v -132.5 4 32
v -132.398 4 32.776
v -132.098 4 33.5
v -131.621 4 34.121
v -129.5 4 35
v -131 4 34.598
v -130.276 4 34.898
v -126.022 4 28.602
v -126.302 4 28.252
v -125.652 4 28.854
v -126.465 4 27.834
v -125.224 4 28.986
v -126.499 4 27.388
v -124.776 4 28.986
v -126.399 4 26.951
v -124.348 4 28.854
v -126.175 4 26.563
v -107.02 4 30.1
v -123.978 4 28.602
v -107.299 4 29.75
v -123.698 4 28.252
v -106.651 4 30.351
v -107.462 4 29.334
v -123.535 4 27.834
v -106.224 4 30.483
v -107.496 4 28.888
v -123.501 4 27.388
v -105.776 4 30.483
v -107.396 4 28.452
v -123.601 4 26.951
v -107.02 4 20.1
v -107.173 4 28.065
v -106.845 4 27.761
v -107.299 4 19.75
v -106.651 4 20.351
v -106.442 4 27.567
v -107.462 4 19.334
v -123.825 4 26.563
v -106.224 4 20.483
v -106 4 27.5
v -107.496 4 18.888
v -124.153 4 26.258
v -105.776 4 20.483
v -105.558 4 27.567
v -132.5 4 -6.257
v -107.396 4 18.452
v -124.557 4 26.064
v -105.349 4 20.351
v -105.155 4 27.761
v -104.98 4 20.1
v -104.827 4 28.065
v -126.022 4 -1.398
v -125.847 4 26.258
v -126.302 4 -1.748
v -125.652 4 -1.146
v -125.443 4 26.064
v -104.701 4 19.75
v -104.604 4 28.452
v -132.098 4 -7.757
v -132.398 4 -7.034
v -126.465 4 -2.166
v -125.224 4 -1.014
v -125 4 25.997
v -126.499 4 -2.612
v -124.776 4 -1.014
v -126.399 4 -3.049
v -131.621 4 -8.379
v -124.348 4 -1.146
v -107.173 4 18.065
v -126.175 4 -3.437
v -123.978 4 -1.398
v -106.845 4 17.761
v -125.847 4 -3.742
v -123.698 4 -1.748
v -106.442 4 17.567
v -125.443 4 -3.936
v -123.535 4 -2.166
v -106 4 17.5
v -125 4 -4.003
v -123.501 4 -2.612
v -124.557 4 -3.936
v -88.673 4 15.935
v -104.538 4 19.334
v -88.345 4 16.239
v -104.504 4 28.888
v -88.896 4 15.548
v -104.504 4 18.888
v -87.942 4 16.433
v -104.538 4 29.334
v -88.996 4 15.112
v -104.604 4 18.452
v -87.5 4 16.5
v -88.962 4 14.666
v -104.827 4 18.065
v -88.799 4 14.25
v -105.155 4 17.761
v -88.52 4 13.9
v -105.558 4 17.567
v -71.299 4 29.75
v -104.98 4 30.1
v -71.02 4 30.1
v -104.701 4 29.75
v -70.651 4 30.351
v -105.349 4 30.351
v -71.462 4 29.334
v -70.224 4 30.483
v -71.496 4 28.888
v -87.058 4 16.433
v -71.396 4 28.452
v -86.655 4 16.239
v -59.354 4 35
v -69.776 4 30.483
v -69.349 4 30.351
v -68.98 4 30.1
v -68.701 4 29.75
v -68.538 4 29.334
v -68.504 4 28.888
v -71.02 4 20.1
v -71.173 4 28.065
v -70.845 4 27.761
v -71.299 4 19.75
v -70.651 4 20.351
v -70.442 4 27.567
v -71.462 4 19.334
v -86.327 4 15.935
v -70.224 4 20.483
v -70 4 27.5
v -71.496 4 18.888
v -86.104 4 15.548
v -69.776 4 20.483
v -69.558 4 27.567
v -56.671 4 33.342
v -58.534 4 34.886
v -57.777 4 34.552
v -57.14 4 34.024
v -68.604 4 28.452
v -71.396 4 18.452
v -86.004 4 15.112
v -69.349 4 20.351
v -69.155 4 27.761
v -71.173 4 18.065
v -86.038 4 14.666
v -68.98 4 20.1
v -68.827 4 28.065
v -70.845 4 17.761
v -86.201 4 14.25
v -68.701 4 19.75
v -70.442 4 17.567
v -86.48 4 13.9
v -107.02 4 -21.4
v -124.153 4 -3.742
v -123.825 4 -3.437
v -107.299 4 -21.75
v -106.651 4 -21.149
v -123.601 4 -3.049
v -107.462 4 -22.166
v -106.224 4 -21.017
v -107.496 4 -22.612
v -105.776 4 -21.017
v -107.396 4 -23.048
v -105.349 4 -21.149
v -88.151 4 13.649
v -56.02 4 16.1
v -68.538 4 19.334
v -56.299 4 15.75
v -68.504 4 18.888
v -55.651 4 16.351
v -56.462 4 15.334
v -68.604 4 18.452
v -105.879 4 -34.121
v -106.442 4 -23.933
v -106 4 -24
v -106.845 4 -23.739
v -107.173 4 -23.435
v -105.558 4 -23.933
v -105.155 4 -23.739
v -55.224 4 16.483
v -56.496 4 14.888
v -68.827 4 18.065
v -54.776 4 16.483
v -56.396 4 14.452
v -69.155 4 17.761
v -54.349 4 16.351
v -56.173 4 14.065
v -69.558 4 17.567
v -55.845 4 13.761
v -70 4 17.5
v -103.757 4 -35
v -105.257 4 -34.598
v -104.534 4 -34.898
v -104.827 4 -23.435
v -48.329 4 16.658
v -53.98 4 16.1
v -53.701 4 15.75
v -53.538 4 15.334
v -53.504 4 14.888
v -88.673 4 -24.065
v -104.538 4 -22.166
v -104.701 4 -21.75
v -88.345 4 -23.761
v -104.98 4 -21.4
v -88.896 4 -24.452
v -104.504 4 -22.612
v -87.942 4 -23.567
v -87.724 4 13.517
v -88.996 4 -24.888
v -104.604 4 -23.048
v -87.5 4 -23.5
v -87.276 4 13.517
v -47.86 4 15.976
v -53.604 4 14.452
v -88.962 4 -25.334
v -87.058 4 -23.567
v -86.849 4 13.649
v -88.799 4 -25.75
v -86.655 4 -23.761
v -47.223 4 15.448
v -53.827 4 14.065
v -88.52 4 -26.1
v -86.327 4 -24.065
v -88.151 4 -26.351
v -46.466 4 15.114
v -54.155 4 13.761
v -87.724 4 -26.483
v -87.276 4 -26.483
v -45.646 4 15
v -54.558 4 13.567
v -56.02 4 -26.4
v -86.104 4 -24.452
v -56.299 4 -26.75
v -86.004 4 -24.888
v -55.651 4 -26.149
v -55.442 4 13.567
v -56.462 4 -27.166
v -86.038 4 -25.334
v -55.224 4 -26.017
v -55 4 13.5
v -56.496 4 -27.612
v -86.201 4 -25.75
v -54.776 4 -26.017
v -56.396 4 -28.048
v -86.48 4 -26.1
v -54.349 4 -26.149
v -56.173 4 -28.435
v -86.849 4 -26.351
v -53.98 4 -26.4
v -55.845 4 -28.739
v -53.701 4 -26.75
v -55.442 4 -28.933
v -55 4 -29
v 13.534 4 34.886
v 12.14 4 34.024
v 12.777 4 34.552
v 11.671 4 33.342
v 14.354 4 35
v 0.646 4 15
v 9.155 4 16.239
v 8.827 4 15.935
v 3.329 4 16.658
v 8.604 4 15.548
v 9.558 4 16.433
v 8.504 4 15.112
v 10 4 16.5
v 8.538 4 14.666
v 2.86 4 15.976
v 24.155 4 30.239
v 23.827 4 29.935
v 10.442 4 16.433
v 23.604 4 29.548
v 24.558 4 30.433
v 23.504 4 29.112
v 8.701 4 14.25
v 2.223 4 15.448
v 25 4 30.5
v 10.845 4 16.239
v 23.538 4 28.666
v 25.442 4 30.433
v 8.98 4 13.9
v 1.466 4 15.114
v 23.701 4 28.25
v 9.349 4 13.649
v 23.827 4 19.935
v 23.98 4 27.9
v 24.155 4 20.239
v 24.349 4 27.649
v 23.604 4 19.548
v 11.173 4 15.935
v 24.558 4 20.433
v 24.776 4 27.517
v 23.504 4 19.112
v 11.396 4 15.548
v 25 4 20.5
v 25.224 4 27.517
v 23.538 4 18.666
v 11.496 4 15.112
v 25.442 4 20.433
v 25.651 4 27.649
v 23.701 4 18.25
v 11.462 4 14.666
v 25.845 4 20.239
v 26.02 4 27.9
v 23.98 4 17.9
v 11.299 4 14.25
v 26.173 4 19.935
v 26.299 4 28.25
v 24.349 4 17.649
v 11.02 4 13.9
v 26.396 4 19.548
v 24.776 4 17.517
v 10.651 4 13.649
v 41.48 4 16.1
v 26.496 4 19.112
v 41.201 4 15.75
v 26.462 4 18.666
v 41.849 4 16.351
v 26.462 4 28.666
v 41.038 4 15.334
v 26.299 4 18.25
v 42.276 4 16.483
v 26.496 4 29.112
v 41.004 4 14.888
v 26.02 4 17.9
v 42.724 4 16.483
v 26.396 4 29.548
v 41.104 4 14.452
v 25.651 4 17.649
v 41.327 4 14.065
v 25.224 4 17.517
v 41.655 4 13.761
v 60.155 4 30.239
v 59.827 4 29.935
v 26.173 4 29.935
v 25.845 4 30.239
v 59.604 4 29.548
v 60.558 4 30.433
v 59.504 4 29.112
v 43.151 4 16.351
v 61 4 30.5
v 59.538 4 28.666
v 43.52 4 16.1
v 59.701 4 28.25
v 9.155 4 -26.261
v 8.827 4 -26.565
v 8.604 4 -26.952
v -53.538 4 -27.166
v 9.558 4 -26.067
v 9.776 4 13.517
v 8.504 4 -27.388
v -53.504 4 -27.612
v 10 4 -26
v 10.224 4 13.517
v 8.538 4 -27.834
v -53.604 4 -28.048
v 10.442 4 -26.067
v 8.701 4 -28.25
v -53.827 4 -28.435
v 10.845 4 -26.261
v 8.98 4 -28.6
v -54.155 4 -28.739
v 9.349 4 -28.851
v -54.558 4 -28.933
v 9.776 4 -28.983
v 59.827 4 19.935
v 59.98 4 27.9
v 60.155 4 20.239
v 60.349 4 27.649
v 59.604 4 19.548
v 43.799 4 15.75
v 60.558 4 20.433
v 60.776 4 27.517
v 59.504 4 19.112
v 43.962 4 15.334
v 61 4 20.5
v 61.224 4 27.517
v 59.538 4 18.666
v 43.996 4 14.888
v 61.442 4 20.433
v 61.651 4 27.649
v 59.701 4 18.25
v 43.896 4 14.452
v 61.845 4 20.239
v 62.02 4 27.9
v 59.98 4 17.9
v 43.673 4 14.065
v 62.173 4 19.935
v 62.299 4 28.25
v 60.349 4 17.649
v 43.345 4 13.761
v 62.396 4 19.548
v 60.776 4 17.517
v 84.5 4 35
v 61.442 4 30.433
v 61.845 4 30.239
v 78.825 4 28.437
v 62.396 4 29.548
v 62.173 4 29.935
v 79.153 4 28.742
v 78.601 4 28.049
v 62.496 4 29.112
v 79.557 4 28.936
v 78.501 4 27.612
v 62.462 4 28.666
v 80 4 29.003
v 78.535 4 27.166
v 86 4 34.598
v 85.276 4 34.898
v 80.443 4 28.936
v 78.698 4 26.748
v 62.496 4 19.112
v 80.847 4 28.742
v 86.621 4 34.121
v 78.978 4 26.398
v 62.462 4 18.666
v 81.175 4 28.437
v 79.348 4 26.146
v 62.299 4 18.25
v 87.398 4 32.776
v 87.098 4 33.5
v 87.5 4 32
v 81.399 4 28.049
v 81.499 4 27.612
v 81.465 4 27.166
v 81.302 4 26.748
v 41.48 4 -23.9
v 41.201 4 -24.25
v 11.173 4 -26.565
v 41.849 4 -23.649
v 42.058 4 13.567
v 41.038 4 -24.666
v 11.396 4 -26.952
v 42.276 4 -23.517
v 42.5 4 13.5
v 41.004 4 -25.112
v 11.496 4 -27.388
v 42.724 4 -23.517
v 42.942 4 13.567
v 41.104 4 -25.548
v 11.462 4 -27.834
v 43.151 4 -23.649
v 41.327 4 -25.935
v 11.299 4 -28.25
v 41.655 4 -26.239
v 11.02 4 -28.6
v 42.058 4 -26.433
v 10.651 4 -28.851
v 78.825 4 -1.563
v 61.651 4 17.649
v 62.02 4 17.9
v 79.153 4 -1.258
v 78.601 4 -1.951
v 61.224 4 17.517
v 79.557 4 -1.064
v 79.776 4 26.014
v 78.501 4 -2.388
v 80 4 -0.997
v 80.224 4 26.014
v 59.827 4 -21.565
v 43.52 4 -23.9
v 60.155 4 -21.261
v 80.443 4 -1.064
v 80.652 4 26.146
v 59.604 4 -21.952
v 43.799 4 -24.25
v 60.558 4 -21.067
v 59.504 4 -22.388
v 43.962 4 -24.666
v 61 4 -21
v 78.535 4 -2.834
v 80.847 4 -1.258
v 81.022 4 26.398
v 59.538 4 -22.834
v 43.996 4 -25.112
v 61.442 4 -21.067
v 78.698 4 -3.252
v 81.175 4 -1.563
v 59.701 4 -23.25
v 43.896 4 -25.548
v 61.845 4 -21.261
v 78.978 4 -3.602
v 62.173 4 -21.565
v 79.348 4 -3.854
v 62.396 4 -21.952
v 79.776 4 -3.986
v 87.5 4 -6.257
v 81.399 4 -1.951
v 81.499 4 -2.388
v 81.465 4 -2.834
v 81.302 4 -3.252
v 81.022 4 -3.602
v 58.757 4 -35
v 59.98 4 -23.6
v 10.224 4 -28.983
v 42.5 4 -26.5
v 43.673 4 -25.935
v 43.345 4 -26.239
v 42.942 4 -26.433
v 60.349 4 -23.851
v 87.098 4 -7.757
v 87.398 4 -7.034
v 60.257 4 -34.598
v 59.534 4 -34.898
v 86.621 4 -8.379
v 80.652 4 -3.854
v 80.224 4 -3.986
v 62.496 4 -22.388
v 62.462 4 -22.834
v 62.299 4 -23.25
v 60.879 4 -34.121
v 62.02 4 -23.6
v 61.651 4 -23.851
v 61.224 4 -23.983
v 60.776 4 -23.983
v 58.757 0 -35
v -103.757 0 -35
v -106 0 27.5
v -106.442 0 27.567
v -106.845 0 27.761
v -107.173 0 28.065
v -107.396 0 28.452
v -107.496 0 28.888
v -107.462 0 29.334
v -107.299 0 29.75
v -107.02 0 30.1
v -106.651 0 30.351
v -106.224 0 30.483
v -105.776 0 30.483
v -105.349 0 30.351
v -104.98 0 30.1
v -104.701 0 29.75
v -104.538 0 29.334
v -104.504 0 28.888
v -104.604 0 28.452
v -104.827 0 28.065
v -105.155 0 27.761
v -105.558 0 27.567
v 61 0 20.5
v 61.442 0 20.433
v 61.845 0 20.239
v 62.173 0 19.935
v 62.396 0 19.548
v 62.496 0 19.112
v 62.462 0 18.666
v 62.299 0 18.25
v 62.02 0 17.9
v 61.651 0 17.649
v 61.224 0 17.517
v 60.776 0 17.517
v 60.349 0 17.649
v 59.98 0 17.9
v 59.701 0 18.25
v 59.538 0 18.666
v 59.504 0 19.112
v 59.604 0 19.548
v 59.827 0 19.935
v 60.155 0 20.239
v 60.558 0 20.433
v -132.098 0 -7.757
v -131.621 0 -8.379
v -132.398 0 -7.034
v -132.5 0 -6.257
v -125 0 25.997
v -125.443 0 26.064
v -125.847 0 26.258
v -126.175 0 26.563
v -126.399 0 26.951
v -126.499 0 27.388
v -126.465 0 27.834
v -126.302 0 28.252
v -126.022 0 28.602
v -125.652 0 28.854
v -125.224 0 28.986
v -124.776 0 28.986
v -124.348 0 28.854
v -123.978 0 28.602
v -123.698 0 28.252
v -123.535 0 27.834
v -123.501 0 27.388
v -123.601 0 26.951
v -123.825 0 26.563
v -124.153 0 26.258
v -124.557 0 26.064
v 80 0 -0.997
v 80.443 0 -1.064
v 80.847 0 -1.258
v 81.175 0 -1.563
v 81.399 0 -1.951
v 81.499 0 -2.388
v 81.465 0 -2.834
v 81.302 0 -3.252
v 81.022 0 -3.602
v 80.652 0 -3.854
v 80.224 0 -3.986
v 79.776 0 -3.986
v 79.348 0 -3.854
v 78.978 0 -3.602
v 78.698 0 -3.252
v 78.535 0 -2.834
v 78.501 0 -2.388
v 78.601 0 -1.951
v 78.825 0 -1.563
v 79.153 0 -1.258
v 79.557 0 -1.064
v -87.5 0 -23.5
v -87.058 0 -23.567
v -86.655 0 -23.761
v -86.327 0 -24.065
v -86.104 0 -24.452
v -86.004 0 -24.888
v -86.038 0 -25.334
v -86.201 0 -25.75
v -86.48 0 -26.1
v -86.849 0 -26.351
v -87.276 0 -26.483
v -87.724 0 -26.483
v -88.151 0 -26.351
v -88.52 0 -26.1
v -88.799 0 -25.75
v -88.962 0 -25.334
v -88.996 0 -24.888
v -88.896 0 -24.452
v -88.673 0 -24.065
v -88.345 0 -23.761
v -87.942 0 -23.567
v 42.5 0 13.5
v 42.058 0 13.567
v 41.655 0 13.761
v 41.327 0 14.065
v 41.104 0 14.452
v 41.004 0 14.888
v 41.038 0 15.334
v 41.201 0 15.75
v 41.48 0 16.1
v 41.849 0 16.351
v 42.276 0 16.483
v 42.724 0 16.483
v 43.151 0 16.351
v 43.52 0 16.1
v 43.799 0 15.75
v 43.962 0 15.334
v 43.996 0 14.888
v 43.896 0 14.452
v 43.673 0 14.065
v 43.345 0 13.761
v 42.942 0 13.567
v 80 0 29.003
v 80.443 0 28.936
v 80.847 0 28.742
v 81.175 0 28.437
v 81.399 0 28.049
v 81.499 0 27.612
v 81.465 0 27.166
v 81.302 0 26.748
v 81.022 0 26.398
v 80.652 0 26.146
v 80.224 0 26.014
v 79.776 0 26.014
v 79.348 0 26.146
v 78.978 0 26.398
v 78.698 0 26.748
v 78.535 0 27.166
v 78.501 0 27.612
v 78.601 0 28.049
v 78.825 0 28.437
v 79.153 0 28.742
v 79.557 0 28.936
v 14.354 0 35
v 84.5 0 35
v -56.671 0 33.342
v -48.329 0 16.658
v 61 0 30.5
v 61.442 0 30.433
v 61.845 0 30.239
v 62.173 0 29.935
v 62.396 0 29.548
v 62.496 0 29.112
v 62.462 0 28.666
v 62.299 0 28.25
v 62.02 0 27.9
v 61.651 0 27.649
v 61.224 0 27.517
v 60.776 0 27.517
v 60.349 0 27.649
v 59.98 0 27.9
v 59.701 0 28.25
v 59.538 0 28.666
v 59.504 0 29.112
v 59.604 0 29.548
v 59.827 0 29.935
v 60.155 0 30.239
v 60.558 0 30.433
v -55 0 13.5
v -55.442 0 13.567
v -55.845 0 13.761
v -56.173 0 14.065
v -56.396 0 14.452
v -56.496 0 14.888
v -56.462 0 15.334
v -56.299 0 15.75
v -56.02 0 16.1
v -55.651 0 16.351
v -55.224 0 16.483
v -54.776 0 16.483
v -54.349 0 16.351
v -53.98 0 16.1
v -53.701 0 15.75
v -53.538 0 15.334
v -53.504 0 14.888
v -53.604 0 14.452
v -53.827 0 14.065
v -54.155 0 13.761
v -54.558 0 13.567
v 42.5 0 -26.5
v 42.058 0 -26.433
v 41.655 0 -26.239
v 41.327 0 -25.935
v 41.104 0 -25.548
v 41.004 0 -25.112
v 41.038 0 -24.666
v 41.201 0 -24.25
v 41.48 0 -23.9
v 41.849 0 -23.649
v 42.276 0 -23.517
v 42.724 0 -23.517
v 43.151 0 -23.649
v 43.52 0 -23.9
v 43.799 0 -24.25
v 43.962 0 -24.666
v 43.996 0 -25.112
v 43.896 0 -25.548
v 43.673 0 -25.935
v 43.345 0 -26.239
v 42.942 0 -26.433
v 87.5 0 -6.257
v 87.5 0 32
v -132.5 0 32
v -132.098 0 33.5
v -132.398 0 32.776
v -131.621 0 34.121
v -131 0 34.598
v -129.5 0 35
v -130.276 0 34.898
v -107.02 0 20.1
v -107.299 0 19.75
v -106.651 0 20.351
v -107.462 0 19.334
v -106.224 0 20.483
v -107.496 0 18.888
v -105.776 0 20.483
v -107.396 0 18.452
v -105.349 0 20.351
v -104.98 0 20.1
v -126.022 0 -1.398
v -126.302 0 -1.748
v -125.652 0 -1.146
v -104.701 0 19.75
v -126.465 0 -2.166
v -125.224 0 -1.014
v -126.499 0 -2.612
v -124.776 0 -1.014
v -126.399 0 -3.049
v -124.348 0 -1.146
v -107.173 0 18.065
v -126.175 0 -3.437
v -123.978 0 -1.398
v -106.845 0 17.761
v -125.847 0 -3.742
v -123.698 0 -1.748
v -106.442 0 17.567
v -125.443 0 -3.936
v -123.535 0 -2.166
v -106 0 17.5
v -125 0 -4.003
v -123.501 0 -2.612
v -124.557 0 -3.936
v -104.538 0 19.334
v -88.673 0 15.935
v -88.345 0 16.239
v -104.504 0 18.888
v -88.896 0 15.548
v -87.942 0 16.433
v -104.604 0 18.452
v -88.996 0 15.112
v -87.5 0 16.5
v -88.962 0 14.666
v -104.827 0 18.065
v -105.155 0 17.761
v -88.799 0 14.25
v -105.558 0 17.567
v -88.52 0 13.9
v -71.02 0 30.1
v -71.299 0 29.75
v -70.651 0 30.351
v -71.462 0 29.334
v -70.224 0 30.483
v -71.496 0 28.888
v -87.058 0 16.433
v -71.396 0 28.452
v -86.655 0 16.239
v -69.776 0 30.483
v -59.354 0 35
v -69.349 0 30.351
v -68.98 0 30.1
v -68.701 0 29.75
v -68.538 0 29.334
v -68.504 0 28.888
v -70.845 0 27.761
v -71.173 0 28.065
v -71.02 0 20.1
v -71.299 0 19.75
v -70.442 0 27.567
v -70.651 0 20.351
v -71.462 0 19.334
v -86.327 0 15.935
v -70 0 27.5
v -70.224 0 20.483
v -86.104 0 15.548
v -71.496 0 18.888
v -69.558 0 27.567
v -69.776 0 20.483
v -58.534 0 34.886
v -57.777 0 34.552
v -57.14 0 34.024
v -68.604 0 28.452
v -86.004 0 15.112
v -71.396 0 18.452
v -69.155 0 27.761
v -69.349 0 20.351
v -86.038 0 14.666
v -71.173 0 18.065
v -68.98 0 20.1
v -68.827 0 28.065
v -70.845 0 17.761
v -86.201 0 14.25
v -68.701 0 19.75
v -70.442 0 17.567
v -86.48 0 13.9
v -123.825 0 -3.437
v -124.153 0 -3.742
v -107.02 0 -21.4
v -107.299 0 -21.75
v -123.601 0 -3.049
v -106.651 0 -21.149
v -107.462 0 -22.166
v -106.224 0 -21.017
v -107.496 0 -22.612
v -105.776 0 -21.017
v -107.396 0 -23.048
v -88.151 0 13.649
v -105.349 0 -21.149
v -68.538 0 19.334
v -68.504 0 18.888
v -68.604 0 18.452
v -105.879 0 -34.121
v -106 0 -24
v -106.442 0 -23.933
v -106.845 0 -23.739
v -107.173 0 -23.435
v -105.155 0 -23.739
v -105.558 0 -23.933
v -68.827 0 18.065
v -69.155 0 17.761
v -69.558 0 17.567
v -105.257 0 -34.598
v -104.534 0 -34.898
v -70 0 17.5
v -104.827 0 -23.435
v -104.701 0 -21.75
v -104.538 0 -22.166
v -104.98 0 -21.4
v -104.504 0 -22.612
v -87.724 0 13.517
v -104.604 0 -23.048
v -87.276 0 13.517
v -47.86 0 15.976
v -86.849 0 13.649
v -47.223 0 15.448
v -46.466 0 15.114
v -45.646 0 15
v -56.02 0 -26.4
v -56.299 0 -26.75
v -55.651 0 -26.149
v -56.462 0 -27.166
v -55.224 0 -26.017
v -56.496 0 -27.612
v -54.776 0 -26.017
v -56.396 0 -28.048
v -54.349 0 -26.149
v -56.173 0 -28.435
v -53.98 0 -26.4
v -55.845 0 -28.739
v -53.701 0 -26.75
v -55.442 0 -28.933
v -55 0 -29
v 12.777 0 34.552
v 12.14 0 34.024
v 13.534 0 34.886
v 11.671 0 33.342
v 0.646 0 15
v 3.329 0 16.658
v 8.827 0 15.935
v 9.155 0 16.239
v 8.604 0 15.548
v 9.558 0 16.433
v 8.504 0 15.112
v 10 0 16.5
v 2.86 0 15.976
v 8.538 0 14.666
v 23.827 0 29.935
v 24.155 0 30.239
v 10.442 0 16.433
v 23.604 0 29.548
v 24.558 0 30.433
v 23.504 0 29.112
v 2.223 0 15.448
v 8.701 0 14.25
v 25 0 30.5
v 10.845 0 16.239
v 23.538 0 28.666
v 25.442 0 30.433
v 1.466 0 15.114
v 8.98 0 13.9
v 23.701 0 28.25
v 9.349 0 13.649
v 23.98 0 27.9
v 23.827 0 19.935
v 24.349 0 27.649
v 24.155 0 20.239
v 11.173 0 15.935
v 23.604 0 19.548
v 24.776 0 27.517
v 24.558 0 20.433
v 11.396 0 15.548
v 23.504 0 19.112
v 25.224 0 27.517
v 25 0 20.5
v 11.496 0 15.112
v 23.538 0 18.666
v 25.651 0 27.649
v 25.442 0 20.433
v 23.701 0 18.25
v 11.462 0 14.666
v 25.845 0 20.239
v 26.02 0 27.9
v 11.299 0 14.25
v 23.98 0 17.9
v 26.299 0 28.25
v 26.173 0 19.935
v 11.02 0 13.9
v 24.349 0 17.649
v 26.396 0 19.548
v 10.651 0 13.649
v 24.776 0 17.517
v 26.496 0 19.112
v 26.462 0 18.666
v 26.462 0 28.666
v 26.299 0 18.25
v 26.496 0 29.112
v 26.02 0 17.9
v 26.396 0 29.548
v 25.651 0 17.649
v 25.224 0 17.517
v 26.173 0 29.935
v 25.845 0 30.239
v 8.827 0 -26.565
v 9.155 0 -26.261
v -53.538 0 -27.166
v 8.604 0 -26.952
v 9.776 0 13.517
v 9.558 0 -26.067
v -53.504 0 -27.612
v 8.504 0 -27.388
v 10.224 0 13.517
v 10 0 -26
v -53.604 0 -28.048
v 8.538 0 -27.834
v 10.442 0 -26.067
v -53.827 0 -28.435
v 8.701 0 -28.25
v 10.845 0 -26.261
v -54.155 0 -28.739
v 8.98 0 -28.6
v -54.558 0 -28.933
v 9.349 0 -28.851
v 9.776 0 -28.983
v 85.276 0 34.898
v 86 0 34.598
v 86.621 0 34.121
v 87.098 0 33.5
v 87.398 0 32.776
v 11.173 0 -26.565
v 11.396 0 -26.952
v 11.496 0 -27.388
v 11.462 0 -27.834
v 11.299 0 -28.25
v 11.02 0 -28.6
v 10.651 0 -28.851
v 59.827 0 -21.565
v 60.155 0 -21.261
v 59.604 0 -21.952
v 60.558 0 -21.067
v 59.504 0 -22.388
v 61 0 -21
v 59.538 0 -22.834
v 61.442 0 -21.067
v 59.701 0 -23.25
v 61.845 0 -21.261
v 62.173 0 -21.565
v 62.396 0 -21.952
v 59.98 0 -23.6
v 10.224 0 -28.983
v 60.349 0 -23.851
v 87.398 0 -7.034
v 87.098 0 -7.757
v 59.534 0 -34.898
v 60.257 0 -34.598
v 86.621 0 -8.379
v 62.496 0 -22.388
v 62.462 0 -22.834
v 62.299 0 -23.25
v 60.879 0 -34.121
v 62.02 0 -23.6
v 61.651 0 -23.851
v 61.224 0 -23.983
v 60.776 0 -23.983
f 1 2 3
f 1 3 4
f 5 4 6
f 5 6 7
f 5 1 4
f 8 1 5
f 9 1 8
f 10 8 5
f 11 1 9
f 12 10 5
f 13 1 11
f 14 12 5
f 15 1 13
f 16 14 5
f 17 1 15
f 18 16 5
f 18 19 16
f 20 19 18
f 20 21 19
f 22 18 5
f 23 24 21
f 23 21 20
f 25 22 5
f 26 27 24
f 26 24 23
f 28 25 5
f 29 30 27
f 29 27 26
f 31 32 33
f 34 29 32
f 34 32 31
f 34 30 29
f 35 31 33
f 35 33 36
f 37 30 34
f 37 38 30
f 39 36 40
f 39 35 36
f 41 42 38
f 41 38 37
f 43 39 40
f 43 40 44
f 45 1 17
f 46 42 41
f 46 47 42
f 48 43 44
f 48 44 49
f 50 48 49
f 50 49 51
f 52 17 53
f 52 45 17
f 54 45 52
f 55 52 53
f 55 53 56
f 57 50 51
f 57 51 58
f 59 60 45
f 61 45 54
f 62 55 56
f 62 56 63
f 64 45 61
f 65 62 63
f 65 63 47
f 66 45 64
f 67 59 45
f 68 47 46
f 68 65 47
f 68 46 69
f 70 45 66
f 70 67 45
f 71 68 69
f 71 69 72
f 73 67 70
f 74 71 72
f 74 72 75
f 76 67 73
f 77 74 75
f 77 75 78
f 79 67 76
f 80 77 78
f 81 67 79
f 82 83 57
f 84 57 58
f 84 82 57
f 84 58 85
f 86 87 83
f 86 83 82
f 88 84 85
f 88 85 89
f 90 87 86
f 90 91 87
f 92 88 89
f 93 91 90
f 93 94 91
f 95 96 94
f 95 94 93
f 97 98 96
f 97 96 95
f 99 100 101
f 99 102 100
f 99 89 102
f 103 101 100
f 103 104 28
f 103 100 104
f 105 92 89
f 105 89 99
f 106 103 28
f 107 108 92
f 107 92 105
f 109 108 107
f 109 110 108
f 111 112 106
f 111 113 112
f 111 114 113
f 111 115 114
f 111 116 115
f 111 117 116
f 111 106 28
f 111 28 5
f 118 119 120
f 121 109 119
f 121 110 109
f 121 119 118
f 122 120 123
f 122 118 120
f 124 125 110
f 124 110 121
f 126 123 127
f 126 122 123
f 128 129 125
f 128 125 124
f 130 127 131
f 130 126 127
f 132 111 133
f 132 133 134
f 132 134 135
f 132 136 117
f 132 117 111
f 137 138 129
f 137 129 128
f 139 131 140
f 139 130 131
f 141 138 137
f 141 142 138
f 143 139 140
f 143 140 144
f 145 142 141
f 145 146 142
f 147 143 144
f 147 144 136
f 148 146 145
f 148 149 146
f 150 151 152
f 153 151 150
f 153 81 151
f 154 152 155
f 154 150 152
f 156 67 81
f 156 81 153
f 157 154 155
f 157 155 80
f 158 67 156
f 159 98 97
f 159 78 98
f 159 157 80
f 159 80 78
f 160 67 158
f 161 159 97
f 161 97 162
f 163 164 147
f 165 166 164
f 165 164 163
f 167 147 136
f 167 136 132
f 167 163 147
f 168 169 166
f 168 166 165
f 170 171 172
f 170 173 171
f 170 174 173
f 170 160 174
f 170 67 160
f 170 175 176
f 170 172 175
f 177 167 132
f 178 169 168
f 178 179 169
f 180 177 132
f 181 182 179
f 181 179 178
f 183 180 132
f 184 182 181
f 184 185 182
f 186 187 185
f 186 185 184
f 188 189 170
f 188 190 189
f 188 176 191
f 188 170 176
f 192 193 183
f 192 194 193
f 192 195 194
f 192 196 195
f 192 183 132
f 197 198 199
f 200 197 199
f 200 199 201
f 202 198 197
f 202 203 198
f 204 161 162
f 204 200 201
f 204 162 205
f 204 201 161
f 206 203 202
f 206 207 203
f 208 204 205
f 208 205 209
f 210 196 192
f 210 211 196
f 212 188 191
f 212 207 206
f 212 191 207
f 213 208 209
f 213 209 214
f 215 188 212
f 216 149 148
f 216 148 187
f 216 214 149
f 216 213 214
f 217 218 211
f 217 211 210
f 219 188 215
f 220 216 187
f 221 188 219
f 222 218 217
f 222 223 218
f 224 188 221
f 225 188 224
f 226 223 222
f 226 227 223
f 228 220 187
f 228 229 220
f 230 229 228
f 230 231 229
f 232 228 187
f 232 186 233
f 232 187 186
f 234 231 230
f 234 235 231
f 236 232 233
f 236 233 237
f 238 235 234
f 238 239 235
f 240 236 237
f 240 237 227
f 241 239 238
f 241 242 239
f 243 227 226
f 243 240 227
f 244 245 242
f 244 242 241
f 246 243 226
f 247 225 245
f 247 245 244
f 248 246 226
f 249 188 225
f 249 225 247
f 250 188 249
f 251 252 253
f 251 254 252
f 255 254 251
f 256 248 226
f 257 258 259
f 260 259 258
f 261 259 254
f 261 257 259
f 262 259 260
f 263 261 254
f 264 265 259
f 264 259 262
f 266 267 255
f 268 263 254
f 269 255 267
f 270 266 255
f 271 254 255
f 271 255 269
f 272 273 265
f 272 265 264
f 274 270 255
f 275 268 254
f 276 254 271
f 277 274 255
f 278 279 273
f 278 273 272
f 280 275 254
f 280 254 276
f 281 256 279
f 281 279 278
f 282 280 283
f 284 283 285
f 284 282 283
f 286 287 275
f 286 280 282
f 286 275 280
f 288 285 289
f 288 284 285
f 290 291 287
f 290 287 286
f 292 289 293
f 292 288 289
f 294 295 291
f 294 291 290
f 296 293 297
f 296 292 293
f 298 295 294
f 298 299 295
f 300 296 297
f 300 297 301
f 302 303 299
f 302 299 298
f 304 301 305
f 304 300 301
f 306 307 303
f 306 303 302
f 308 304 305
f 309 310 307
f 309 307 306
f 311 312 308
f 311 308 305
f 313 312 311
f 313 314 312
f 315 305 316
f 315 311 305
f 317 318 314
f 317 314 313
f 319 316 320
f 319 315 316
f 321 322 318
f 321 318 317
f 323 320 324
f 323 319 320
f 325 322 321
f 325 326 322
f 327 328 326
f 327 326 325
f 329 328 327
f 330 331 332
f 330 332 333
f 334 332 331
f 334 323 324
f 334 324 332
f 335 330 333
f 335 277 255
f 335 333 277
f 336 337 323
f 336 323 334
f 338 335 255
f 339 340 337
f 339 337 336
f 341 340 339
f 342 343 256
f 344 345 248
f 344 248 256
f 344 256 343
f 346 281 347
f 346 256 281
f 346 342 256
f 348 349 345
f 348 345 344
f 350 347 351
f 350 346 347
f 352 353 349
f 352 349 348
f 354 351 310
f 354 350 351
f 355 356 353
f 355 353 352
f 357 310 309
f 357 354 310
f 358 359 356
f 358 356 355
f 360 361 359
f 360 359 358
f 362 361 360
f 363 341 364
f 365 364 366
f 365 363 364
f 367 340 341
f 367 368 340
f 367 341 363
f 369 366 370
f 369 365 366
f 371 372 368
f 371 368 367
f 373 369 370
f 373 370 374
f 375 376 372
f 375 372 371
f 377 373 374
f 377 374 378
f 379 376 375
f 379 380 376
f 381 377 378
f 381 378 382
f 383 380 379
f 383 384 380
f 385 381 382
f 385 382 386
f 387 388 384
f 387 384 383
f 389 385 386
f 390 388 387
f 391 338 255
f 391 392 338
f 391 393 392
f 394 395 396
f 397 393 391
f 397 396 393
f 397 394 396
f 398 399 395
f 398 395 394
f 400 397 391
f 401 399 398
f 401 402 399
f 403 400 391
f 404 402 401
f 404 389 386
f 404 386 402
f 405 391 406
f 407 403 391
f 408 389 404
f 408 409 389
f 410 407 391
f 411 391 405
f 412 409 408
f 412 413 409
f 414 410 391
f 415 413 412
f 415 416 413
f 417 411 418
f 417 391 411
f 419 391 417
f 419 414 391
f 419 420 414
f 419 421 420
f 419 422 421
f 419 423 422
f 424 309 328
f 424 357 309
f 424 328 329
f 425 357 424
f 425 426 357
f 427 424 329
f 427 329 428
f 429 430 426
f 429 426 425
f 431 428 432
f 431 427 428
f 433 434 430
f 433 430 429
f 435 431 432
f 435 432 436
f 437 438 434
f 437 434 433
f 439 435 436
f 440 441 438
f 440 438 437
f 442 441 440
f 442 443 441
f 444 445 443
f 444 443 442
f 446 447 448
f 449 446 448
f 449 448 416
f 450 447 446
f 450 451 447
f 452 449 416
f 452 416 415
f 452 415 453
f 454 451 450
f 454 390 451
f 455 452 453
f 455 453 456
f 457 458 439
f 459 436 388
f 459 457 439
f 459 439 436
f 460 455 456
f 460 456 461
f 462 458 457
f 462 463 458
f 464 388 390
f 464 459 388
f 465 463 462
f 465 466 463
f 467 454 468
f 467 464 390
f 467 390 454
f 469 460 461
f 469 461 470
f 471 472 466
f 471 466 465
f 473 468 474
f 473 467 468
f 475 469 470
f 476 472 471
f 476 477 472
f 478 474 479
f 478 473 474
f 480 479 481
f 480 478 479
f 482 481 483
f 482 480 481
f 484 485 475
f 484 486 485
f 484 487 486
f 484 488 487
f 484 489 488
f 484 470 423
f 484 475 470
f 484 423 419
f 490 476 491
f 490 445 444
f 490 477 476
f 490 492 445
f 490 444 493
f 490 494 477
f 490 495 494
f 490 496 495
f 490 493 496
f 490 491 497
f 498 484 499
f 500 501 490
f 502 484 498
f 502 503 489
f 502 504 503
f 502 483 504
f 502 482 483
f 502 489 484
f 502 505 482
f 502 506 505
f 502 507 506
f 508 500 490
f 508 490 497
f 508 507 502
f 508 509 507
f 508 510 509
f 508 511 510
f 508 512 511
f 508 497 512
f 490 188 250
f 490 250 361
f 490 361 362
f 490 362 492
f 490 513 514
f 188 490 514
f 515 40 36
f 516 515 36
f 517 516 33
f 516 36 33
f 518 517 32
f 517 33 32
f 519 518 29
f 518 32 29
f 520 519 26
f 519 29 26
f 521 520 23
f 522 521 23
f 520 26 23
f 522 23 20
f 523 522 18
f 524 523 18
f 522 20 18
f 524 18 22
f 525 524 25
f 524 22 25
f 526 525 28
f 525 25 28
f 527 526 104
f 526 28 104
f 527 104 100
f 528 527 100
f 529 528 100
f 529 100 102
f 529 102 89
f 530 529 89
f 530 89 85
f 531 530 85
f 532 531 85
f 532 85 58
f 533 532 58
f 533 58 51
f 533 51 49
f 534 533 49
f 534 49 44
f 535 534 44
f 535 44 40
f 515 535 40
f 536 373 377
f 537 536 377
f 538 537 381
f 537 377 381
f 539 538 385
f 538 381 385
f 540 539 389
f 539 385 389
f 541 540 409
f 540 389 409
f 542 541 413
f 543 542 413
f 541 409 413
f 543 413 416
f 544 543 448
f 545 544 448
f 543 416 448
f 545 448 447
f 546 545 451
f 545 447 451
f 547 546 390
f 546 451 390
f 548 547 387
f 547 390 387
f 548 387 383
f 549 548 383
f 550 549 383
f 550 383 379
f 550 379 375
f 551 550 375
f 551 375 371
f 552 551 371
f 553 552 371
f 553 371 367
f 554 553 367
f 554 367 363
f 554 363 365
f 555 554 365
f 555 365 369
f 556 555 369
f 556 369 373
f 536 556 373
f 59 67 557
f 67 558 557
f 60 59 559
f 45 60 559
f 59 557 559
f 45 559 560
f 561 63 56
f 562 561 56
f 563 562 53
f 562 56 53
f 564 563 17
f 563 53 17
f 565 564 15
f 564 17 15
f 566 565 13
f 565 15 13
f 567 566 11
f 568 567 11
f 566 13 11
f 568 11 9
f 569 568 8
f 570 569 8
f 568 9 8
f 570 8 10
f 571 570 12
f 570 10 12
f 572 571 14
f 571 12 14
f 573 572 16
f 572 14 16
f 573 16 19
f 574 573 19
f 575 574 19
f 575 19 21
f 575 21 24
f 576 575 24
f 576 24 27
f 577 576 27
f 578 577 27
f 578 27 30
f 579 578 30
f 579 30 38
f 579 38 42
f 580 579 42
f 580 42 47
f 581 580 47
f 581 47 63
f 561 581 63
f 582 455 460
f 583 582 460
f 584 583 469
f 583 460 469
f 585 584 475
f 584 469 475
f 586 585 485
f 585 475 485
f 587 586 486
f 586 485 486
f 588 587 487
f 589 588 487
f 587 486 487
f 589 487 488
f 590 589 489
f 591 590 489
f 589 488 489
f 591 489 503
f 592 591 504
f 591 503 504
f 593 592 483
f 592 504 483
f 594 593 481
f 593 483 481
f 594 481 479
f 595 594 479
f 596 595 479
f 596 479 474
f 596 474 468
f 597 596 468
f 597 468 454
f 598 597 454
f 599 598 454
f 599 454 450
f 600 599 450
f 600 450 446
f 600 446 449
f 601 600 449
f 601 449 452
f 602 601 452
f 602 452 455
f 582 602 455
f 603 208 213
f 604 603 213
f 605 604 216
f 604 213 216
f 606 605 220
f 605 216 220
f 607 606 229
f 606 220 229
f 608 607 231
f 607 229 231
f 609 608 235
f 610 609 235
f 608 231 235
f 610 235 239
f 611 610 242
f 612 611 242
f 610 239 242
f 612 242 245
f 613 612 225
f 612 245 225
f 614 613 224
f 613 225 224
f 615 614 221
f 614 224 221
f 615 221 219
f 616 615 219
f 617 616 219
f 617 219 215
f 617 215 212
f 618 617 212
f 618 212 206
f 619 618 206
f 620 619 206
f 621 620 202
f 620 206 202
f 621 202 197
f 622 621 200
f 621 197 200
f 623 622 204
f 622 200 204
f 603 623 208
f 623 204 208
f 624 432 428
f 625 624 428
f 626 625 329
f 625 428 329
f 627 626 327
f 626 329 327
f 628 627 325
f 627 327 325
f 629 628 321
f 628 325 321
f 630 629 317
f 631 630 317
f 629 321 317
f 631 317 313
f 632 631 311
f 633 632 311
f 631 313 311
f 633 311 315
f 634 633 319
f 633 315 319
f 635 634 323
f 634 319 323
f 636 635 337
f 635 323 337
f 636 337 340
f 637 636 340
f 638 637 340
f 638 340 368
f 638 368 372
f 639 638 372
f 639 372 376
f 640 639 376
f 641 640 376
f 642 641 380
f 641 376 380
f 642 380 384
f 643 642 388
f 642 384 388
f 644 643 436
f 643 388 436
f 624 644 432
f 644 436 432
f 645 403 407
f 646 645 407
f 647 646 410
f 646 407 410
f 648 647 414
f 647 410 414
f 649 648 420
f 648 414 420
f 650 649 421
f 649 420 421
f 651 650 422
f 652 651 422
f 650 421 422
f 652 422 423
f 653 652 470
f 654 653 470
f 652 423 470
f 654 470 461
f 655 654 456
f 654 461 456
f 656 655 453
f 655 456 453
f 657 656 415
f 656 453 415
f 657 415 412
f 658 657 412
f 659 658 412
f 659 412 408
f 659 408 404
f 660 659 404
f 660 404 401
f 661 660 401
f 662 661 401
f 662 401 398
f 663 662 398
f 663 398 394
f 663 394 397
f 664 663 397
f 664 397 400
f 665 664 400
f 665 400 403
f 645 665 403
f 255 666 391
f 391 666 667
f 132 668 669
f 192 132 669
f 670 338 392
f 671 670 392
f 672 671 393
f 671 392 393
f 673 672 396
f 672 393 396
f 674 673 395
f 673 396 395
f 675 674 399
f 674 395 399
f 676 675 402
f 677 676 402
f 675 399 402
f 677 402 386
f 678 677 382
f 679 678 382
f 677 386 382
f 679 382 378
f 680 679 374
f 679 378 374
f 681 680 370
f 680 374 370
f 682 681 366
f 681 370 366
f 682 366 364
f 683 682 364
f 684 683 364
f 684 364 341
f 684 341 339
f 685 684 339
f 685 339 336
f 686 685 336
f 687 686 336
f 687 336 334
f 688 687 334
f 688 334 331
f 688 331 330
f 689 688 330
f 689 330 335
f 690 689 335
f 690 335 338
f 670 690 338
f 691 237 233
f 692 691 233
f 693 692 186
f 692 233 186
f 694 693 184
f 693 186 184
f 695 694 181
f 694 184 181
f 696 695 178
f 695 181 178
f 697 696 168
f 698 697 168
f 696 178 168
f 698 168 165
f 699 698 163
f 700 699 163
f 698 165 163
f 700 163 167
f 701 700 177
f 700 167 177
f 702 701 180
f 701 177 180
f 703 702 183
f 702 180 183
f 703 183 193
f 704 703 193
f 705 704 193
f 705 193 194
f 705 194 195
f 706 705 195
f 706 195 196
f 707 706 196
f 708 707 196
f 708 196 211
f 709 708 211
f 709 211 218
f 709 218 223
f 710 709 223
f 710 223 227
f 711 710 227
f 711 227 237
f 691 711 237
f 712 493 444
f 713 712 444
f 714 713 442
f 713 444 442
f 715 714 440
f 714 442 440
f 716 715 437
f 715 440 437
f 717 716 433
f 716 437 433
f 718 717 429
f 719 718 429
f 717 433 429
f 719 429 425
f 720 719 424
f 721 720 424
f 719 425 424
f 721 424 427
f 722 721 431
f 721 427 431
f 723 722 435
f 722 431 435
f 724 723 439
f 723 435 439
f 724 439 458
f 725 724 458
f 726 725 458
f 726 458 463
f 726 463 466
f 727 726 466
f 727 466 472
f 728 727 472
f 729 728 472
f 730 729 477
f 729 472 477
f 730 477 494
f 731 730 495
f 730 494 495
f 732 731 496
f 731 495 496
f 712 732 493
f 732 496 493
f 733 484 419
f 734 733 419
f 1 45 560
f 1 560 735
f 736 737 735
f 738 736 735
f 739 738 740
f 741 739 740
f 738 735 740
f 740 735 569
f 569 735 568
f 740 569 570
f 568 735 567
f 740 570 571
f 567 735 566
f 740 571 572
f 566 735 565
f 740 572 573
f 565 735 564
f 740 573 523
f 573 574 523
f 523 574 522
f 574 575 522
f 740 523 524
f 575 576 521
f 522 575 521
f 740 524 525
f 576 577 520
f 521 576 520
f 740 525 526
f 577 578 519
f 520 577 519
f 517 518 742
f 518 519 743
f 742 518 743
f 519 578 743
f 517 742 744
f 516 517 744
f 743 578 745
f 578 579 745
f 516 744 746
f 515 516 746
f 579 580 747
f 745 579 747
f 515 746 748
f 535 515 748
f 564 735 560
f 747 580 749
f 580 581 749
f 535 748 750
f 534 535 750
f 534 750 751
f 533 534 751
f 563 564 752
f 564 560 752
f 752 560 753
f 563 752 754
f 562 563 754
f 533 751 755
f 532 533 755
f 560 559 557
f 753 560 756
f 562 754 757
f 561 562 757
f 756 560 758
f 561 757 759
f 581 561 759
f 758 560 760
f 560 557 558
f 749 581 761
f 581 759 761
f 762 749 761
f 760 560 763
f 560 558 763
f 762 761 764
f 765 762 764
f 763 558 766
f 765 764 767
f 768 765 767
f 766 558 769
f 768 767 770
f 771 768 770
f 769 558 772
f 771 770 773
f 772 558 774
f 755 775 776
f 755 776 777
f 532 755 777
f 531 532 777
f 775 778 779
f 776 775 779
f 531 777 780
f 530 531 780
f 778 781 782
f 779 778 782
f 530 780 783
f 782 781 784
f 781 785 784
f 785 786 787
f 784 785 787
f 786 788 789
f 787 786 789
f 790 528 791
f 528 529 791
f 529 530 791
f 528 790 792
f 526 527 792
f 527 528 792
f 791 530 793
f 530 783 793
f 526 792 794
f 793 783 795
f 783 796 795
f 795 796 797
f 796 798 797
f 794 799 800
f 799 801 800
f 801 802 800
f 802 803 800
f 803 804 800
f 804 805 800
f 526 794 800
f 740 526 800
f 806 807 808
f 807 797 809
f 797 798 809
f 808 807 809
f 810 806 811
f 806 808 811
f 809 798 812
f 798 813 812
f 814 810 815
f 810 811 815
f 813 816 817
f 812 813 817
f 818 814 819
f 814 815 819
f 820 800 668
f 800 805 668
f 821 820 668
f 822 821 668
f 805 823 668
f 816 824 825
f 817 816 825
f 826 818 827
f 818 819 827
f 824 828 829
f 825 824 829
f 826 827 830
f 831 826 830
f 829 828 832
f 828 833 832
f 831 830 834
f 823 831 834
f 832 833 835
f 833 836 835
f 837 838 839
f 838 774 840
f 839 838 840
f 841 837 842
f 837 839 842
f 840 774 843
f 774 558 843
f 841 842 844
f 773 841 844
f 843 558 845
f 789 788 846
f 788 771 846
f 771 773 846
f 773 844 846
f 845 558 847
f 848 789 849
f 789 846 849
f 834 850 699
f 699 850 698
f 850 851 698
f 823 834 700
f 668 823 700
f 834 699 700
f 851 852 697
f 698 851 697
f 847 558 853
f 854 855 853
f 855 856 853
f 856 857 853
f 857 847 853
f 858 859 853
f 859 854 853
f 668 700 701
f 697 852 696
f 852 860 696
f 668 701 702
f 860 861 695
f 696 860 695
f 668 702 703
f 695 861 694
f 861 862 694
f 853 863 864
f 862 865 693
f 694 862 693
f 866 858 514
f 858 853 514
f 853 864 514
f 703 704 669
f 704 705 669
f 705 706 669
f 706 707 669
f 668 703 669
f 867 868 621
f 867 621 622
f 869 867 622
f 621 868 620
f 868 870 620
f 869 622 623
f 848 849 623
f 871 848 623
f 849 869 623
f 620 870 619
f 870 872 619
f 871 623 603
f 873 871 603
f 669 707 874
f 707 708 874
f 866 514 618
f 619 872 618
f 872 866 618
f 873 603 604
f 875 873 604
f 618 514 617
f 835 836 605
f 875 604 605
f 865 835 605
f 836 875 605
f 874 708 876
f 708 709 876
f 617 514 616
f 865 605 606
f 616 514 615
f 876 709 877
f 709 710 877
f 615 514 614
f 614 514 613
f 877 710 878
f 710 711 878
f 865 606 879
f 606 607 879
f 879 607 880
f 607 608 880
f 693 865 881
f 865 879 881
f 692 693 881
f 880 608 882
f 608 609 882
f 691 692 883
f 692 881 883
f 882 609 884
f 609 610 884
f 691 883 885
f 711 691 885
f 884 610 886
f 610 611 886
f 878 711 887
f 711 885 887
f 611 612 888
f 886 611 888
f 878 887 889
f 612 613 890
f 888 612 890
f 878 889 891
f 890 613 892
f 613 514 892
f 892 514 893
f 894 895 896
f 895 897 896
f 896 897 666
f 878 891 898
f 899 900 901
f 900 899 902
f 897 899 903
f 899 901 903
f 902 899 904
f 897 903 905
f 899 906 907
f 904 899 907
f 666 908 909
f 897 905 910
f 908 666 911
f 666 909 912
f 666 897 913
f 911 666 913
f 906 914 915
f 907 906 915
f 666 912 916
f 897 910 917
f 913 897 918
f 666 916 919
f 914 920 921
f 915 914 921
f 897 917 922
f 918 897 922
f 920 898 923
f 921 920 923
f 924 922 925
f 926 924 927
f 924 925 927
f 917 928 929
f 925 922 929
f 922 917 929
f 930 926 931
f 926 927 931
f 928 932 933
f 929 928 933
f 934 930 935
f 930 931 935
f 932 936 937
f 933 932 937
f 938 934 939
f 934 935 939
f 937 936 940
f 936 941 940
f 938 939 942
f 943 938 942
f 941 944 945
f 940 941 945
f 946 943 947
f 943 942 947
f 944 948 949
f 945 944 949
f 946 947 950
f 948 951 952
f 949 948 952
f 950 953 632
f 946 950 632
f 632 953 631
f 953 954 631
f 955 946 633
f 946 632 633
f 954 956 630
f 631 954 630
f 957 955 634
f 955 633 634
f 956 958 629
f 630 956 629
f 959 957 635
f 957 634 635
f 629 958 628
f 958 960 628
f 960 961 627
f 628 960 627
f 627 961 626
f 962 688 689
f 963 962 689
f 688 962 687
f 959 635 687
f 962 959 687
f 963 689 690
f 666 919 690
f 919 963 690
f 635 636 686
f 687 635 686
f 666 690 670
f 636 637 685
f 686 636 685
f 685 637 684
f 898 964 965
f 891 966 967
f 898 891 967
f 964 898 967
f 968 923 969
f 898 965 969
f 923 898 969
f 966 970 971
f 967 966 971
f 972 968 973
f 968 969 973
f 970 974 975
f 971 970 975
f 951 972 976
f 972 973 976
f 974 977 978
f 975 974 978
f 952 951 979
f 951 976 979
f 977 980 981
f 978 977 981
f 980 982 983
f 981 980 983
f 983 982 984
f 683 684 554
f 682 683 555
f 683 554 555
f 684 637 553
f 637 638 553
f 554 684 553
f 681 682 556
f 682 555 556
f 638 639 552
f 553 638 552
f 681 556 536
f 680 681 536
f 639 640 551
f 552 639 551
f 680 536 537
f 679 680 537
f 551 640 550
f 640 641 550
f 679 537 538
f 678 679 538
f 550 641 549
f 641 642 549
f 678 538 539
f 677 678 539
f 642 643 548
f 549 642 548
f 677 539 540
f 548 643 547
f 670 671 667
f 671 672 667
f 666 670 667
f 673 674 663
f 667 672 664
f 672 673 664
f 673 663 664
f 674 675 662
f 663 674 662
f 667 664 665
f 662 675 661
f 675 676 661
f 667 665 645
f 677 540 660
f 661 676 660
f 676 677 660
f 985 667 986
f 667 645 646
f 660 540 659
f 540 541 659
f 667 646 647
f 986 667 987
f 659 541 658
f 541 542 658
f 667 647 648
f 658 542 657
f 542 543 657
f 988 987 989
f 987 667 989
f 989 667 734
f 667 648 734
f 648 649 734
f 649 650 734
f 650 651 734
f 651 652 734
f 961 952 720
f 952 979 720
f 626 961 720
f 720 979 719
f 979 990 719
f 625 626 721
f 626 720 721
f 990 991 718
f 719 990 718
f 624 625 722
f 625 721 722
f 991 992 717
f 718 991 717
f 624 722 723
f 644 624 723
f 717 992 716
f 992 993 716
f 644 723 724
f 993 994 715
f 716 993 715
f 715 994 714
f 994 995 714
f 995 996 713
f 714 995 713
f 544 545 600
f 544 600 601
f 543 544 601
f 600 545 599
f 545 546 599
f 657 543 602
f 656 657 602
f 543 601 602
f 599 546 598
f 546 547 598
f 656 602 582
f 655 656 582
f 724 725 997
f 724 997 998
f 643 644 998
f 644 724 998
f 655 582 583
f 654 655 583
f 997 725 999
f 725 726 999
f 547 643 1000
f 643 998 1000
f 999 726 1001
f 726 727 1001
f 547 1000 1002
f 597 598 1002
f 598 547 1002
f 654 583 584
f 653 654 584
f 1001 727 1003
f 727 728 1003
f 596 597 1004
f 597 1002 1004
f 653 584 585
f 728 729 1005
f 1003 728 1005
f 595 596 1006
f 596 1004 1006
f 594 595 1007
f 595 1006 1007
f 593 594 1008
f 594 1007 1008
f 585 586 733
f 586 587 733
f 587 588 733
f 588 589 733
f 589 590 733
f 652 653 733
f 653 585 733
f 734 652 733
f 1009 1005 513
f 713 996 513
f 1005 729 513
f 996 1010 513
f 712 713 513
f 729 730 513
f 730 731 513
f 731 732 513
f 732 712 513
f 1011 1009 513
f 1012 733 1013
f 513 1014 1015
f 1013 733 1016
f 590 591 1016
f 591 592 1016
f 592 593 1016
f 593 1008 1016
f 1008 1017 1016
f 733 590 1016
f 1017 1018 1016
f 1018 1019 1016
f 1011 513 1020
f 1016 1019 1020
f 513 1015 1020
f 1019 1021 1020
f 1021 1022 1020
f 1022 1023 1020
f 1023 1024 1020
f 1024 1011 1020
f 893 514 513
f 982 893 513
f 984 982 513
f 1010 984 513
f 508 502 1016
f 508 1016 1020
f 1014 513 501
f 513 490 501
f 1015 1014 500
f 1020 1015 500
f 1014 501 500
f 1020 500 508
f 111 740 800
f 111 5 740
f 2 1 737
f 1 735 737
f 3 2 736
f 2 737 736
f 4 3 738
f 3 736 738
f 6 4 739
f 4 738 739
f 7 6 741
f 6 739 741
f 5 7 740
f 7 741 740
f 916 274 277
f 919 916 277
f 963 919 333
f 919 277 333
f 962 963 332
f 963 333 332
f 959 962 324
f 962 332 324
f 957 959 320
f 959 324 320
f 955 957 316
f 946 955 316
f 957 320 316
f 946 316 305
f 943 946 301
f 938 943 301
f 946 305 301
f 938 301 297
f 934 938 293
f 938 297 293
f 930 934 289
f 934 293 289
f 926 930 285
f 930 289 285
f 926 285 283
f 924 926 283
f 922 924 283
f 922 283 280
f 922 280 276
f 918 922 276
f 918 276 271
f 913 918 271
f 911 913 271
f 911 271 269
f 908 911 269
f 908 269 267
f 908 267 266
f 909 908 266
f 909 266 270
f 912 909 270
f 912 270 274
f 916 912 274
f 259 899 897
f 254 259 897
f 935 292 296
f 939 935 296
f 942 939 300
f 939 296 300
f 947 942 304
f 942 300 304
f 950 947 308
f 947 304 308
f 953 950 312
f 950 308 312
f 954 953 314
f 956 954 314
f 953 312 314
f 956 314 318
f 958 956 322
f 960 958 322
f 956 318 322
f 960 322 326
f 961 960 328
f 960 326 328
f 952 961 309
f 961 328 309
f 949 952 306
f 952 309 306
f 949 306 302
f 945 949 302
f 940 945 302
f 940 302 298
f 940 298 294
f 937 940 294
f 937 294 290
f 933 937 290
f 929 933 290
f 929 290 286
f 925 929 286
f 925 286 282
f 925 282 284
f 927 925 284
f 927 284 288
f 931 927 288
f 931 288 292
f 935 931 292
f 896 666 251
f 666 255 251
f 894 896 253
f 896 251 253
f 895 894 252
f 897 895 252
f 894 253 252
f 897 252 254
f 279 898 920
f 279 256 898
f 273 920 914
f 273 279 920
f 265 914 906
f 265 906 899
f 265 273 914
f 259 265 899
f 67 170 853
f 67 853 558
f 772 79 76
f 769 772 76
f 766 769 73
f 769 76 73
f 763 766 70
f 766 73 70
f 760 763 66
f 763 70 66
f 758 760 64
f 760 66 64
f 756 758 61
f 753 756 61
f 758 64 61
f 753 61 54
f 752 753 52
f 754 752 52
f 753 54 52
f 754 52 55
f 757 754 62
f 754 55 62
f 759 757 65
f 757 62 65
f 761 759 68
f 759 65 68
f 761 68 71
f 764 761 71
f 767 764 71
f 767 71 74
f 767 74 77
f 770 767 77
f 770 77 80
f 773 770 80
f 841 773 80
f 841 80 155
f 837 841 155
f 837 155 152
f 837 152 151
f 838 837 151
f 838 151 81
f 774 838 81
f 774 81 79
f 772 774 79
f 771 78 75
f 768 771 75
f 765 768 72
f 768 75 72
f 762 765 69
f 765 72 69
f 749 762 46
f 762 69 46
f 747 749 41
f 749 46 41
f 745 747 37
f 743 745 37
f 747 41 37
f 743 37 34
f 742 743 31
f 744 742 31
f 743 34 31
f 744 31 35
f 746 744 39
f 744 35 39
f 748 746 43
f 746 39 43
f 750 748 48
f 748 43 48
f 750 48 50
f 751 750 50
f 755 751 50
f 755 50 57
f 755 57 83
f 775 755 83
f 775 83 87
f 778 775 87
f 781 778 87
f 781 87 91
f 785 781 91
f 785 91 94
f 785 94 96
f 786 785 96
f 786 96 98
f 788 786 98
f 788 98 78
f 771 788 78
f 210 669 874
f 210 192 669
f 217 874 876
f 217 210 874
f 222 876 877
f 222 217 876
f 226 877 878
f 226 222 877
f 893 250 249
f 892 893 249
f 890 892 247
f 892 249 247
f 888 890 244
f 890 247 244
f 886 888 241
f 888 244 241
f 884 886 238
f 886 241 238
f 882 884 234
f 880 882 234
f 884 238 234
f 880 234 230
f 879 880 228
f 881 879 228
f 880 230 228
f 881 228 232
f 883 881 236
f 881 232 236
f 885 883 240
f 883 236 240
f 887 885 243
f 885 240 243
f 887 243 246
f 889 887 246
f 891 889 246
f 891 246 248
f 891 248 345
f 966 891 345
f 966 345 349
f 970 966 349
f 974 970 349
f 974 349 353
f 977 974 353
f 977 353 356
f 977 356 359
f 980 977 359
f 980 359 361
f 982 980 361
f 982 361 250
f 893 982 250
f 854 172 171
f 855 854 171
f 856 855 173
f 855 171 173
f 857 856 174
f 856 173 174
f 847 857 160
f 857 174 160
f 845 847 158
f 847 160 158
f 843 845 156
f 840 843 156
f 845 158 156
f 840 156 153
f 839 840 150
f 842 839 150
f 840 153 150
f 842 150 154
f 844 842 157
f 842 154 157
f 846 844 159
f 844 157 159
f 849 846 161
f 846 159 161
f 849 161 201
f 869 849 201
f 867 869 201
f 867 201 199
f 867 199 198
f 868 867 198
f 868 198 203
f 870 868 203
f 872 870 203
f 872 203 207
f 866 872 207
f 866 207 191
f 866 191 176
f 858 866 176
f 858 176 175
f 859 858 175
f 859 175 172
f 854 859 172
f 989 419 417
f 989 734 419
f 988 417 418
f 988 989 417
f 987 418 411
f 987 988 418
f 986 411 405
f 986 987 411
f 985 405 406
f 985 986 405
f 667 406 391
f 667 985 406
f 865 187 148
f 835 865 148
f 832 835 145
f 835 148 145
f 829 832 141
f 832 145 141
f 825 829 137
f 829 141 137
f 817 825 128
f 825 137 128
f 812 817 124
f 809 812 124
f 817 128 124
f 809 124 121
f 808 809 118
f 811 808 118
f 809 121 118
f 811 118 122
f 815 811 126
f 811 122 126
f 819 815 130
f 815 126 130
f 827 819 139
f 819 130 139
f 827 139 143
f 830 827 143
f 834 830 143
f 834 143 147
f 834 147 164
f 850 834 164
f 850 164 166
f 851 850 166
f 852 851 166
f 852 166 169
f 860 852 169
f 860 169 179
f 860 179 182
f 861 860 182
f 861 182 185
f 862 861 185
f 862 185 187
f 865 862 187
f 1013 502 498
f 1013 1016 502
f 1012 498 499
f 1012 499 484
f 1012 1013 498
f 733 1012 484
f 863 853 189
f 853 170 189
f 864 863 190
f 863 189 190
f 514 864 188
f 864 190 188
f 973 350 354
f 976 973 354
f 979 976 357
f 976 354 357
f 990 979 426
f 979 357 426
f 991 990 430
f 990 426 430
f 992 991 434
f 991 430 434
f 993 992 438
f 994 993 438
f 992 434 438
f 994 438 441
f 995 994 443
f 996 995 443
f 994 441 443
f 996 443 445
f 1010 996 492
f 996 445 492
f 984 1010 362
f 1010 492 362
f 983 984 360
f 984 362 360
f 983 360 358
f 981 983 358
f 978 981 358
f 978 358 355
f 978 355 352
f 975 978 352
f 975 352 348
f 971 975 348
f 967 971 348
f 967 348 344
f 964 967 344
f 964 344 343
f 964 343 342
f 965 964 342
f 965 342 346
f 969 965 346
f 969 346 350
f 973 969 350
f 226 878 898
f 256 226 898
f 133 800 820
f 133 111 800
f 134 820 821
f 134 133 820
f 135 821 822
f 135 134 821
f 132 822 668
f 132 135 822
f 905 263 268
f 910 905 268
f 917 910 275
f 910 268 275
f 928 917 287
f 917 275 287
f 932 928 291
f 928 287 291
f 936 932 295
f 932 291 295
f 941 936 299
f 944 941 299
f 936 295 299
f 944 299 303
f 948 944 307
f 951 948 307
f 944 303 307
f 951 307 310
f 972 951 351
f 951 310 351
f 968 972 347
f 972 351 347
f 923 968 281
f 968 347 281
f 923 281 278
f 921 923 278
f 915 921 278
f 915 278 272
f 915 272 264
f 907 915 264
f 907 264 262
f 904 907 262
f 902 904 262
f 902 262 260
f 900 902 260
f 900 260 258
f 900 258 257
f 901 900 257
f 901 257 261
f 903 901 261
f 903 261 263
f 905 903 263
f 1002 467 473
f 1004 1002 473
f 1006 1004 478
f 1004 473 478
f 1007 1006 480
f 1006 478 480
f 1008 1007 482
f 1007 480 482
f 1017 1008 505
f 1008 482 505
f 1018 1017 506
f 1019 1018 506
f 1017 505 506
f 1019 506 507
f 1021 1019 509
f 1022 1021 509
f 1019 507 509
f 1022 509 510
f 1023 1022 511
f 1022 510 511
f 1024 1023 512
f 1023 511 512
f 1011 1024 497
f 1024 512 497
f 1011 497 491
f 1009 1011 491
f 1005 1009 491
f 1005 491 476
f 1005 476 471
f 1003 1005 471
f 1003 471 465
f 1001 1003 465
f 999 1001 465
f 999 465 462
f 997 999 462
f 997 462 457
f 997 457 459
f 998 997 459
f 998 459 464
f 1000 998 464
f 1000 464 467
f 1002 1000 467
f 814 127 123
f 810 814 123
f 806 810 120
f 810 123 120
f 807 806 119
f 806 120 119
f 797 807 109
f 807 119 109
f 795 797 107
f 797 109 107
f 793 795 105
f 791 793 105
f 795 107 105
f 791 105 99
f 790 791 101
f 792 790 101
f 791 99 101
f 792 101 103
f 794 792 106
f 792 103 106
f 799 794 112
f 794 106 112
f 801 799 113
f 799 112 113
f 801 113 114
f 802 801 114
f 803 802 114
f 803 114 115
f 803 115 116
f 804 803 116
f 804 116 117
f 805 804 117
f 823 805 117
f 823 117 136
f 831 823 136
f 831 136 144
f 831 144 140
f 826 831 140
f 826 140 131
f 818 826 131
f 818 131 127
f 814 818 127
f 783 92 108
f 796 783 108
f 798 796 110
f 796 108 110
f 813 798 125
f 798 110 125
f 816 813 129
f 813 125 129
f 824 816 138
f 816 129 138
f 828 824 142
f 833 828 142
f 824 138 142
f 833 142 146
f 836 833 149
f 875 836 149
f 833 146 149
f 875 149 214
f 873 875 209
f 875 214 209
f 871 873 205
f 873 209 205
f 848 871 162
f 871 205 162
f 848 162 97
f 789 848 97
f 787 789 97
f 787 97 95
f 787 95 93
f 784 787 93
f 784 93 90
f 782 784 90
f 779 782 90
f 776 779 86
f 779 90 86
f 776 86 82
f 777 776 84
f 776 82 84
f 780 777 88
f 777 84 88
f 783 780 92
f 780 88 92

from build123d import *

# Parameters (mm, degrees)
EXTRUDE_1_DEPTH     = 4
SKETCH_2_R          = 1.5
CUT_EXTRUDE_1_DEPTH = 4
SKETCH_3_W          = 10
SKETCH_3_H          = 69.678883607
SKETCH_3_H_2        = 93.047687854
CUT_EXTRUDE_2_DEPTH = 4
CUT_EXTRUDE_3_DEPTH = 4
EXTRUDE_2_DEPTH     = 4
SKETCH_6_R          = 1.5
CUT_EXTRUDE_4_DEPTH = 10
FILLET_1_R          = 3
SKETCH_7_R          = 1.503168948
SKETCH_7_R_2        = 1.5
CUT_EXTRUDE_5_DEPTH = 10
SKETCH_8_R          = 1.5
CUT_EXTRUDE_6_DEPTH = 10


with BuildPart() as part:
    # 草图1 → 凸台-拉伸1 (new body)
    with BuildSketch(Plane(origin=(0, 0, 0), x_dir=(1, 0, 0), z_dir=(0, 1, 0))):
        Polygon((-137.5, -35), (-67.5, -35), (-57.5, -35), (-47.5, -15), (2.5, -15), (12.5, -35), (22.5, -35), (92.5, -35), (92.5, 15), (72.5, 35), (-117.5, 35), (-137.5, 15), align=None)
    extrude(amount=EXTRUDE_1_DEPTH)

    # 草图2 → 切除-拉伸1 (cut)
    with BuildSketch(Plane(origin=(0, 4, 0), x_dir=(1, 0, 0), z_dir=(0, 1, 0))):
        with Locations(Location((-87.5, -15, 0), (0, 0, 270))):
            Circle(SKETCH_2_R)
        with Locations(Location((-87.5, 25, 0), (0, 0, 270))):
            Circle(SKETCH_2_R)
        with Locations(Location((42.5, 25, 0), (0, 0, 90))):
            Circle(SKETCH_2_R)
        with Locations(Location((42.5, -15, 0), (0, 0, 90))):
            Circle(SKETCH_2_R)
    extrude(amount=-CUT_EXTRUDE_1_DEPTH, mode=Mode.SUBTRACT)

    # 草图3 → 切除-拉伸2 (cut)
    with BuildSketch(Plane(origin=(0, 4, 0), x_dir=(1, 0, 0), z_dir=(0, 1, 0))):
        with Locations((-132.5, -0.160558196)):
            Rectangle(SKETCH_3_W, SKETCH_3_H)
        with Locations((87.5, 11.523843927)):
            Rectangle(SKETCH_3_W, SKETCH_3_H_2)
    extrude(amount=-CUT_EXTRUDE_2_DEPTH, mode=Mode.SUBTRACT)

    # 草图4 → 切除-拉伸3 (cut)
    with BuildSketch(Plane(origin=(0, 4, 0), x_dir=(1, 0, 0), z_dir=(0, 1, 0))):
        Polygon((-127.5, 12.5), (-92.197077218, 47.802922782), (-150.178982695, 47.802922782), align=None)
        Polygon((82.5, 12.5), (37.005283765, 57.994716235), (96.544114713, 56.205234398), align=None)
    extrude(amount=-CUT_EXTRUDE_3_DEPTH, mode=Mode.SUBTRACT)

    # 草图5 → 凸台-拉伸2 (add)
    with BuildSketch(Plane(origin=(0, 4, 0), x_dir=(1, 0, 0), z_dir=(0, 1, 0))):
        Polygon((-127.5, 12.5), (-132.5, 7.5), (-132.5, -35), (-127.5, -35), align=None)
        Polygon((82.5, -35), (82.5, 12.5), (87.5, 7.5), (87.5, -35), align=None)
    extrude(amount=-EXTRUDE_2_DEPTH)

    # 草图6 → 切除-拉伸4 (cut)
    with BuildSketch(Plane(origin=(0, 4, 0), x_dir=(1, 0, 0), z_dir=(0, 1, 0))):
        with Locations(Location((61, -29, 0), (0, 0, 270))):
            Circle(SKETCH_6_R)
        with Locations(Location((61, -19, 0), (0, 0, 270))):
            Circle(SKETCH_6_R)
        with Locations(Location((25, -19, 0), (0, 0, 270))):
            Circle(SKETCH_6_R)
        with Locations(Location((25, -29, 0), (0, 0, 270))):
            Circle(SKETCH_6_R)
        with Locations(Location((-70, -29, 0), (0, 0, 90))):
            Circle(SKETCH_6_R)
        with Locations(Location((-70, -19, 0), (0, 0, 90))):
            Circle(SKETCH_6_R)
        with Locations(Location((-106, -19, 0), (0, 0, 90))):
            Circle(SKETCH_6_R)
        with Locations(Location((-106, -29, 0), (0, 0, 90))):
            Circle(SKETCH_6_R)
    extrude(amount=-CUT_EXTRUDE_4_DEPTH, mode=Mode.SUBTRACT)

    # 圆角1
    fillet_1_edges = [part.edges().sort_by_distance(p)[0] for p in [
        (60, 2, -35),
        (-132.5, 2, -7.5),
        (-132.5, 2, 35),
        (87.5, 2, -7.5),
        (87.5, 2, 35),
        (12.5, 2, 35),
        (2.5, 2, 15),
        (-47.5, 2, 15),
        (-57.5, 2, 35),
        (-105, 2, -35),
    ]]
    fillet(fillet_1_edges, radius=FILLET_1_R)

    # 草图7 → 切除-拉伸5 (cut)
    with BuildSketch(Plane(origin=(0, 4, 0), x_dir=(1, 0, 0), z_dir=(0, 1, 0))):
        with Locations(Location((80, -27.5, 0), (0, 0, 270))):
            Circle(SKETCH_7_R)
        with Locations(Location((80, 2.5, 0), (0, 0, 270))):
            Circle(SKETCH_7_R)
        with Locations(Location((-125, 2.5, 0), (0, 0, 90))):
            Circle(SKETCH_7_R)
        with Locations(Location((-125, -27.5, 0), (0, 0, 90))):
            Circle(SKETCH_7_R)
        with Locations(Location((10, -15, 0), (0, 0, 270))):
            Circle(SKETCH_7_R_2)
        with Locations(Location((10, 27.5, 0), (0, 0, 270))):
            Circle(SKETCH_7_R_2)
        with Locations(Location((-55, 27.5, 0), (0, 0, 90))):
            Circle(SKETCH_7_R_2)
        with Locations(Location((-55, -15, 0), (0, 0, 90))):
            Circle(SKETCH_7_R_2)
    extrude(amount=-CUT_EXTRUDE_5_DEPTH, mode=Mode.SUBTRACT)

    # 草图8 → 切除-拉伸6 (cut)
    with BuildSketch(Plane(origin=(0, 4, 0), x_dir=(1, 0, 0), z_dir=(0, 1, 0))):
        with Locations(Location((61, 22.5, 0), (0, 0, 270))):
            Circle(SKETCH_8_R)
        with Locations(Location((-106, 22.5, 0), (0, 0, 90))):
            Circle(SKETCH_8_R)
    extrude(amount=-CUT_EXTRUDE_6_DEPTH, mode=Mode.SUBTRACT)


solid = part.part
